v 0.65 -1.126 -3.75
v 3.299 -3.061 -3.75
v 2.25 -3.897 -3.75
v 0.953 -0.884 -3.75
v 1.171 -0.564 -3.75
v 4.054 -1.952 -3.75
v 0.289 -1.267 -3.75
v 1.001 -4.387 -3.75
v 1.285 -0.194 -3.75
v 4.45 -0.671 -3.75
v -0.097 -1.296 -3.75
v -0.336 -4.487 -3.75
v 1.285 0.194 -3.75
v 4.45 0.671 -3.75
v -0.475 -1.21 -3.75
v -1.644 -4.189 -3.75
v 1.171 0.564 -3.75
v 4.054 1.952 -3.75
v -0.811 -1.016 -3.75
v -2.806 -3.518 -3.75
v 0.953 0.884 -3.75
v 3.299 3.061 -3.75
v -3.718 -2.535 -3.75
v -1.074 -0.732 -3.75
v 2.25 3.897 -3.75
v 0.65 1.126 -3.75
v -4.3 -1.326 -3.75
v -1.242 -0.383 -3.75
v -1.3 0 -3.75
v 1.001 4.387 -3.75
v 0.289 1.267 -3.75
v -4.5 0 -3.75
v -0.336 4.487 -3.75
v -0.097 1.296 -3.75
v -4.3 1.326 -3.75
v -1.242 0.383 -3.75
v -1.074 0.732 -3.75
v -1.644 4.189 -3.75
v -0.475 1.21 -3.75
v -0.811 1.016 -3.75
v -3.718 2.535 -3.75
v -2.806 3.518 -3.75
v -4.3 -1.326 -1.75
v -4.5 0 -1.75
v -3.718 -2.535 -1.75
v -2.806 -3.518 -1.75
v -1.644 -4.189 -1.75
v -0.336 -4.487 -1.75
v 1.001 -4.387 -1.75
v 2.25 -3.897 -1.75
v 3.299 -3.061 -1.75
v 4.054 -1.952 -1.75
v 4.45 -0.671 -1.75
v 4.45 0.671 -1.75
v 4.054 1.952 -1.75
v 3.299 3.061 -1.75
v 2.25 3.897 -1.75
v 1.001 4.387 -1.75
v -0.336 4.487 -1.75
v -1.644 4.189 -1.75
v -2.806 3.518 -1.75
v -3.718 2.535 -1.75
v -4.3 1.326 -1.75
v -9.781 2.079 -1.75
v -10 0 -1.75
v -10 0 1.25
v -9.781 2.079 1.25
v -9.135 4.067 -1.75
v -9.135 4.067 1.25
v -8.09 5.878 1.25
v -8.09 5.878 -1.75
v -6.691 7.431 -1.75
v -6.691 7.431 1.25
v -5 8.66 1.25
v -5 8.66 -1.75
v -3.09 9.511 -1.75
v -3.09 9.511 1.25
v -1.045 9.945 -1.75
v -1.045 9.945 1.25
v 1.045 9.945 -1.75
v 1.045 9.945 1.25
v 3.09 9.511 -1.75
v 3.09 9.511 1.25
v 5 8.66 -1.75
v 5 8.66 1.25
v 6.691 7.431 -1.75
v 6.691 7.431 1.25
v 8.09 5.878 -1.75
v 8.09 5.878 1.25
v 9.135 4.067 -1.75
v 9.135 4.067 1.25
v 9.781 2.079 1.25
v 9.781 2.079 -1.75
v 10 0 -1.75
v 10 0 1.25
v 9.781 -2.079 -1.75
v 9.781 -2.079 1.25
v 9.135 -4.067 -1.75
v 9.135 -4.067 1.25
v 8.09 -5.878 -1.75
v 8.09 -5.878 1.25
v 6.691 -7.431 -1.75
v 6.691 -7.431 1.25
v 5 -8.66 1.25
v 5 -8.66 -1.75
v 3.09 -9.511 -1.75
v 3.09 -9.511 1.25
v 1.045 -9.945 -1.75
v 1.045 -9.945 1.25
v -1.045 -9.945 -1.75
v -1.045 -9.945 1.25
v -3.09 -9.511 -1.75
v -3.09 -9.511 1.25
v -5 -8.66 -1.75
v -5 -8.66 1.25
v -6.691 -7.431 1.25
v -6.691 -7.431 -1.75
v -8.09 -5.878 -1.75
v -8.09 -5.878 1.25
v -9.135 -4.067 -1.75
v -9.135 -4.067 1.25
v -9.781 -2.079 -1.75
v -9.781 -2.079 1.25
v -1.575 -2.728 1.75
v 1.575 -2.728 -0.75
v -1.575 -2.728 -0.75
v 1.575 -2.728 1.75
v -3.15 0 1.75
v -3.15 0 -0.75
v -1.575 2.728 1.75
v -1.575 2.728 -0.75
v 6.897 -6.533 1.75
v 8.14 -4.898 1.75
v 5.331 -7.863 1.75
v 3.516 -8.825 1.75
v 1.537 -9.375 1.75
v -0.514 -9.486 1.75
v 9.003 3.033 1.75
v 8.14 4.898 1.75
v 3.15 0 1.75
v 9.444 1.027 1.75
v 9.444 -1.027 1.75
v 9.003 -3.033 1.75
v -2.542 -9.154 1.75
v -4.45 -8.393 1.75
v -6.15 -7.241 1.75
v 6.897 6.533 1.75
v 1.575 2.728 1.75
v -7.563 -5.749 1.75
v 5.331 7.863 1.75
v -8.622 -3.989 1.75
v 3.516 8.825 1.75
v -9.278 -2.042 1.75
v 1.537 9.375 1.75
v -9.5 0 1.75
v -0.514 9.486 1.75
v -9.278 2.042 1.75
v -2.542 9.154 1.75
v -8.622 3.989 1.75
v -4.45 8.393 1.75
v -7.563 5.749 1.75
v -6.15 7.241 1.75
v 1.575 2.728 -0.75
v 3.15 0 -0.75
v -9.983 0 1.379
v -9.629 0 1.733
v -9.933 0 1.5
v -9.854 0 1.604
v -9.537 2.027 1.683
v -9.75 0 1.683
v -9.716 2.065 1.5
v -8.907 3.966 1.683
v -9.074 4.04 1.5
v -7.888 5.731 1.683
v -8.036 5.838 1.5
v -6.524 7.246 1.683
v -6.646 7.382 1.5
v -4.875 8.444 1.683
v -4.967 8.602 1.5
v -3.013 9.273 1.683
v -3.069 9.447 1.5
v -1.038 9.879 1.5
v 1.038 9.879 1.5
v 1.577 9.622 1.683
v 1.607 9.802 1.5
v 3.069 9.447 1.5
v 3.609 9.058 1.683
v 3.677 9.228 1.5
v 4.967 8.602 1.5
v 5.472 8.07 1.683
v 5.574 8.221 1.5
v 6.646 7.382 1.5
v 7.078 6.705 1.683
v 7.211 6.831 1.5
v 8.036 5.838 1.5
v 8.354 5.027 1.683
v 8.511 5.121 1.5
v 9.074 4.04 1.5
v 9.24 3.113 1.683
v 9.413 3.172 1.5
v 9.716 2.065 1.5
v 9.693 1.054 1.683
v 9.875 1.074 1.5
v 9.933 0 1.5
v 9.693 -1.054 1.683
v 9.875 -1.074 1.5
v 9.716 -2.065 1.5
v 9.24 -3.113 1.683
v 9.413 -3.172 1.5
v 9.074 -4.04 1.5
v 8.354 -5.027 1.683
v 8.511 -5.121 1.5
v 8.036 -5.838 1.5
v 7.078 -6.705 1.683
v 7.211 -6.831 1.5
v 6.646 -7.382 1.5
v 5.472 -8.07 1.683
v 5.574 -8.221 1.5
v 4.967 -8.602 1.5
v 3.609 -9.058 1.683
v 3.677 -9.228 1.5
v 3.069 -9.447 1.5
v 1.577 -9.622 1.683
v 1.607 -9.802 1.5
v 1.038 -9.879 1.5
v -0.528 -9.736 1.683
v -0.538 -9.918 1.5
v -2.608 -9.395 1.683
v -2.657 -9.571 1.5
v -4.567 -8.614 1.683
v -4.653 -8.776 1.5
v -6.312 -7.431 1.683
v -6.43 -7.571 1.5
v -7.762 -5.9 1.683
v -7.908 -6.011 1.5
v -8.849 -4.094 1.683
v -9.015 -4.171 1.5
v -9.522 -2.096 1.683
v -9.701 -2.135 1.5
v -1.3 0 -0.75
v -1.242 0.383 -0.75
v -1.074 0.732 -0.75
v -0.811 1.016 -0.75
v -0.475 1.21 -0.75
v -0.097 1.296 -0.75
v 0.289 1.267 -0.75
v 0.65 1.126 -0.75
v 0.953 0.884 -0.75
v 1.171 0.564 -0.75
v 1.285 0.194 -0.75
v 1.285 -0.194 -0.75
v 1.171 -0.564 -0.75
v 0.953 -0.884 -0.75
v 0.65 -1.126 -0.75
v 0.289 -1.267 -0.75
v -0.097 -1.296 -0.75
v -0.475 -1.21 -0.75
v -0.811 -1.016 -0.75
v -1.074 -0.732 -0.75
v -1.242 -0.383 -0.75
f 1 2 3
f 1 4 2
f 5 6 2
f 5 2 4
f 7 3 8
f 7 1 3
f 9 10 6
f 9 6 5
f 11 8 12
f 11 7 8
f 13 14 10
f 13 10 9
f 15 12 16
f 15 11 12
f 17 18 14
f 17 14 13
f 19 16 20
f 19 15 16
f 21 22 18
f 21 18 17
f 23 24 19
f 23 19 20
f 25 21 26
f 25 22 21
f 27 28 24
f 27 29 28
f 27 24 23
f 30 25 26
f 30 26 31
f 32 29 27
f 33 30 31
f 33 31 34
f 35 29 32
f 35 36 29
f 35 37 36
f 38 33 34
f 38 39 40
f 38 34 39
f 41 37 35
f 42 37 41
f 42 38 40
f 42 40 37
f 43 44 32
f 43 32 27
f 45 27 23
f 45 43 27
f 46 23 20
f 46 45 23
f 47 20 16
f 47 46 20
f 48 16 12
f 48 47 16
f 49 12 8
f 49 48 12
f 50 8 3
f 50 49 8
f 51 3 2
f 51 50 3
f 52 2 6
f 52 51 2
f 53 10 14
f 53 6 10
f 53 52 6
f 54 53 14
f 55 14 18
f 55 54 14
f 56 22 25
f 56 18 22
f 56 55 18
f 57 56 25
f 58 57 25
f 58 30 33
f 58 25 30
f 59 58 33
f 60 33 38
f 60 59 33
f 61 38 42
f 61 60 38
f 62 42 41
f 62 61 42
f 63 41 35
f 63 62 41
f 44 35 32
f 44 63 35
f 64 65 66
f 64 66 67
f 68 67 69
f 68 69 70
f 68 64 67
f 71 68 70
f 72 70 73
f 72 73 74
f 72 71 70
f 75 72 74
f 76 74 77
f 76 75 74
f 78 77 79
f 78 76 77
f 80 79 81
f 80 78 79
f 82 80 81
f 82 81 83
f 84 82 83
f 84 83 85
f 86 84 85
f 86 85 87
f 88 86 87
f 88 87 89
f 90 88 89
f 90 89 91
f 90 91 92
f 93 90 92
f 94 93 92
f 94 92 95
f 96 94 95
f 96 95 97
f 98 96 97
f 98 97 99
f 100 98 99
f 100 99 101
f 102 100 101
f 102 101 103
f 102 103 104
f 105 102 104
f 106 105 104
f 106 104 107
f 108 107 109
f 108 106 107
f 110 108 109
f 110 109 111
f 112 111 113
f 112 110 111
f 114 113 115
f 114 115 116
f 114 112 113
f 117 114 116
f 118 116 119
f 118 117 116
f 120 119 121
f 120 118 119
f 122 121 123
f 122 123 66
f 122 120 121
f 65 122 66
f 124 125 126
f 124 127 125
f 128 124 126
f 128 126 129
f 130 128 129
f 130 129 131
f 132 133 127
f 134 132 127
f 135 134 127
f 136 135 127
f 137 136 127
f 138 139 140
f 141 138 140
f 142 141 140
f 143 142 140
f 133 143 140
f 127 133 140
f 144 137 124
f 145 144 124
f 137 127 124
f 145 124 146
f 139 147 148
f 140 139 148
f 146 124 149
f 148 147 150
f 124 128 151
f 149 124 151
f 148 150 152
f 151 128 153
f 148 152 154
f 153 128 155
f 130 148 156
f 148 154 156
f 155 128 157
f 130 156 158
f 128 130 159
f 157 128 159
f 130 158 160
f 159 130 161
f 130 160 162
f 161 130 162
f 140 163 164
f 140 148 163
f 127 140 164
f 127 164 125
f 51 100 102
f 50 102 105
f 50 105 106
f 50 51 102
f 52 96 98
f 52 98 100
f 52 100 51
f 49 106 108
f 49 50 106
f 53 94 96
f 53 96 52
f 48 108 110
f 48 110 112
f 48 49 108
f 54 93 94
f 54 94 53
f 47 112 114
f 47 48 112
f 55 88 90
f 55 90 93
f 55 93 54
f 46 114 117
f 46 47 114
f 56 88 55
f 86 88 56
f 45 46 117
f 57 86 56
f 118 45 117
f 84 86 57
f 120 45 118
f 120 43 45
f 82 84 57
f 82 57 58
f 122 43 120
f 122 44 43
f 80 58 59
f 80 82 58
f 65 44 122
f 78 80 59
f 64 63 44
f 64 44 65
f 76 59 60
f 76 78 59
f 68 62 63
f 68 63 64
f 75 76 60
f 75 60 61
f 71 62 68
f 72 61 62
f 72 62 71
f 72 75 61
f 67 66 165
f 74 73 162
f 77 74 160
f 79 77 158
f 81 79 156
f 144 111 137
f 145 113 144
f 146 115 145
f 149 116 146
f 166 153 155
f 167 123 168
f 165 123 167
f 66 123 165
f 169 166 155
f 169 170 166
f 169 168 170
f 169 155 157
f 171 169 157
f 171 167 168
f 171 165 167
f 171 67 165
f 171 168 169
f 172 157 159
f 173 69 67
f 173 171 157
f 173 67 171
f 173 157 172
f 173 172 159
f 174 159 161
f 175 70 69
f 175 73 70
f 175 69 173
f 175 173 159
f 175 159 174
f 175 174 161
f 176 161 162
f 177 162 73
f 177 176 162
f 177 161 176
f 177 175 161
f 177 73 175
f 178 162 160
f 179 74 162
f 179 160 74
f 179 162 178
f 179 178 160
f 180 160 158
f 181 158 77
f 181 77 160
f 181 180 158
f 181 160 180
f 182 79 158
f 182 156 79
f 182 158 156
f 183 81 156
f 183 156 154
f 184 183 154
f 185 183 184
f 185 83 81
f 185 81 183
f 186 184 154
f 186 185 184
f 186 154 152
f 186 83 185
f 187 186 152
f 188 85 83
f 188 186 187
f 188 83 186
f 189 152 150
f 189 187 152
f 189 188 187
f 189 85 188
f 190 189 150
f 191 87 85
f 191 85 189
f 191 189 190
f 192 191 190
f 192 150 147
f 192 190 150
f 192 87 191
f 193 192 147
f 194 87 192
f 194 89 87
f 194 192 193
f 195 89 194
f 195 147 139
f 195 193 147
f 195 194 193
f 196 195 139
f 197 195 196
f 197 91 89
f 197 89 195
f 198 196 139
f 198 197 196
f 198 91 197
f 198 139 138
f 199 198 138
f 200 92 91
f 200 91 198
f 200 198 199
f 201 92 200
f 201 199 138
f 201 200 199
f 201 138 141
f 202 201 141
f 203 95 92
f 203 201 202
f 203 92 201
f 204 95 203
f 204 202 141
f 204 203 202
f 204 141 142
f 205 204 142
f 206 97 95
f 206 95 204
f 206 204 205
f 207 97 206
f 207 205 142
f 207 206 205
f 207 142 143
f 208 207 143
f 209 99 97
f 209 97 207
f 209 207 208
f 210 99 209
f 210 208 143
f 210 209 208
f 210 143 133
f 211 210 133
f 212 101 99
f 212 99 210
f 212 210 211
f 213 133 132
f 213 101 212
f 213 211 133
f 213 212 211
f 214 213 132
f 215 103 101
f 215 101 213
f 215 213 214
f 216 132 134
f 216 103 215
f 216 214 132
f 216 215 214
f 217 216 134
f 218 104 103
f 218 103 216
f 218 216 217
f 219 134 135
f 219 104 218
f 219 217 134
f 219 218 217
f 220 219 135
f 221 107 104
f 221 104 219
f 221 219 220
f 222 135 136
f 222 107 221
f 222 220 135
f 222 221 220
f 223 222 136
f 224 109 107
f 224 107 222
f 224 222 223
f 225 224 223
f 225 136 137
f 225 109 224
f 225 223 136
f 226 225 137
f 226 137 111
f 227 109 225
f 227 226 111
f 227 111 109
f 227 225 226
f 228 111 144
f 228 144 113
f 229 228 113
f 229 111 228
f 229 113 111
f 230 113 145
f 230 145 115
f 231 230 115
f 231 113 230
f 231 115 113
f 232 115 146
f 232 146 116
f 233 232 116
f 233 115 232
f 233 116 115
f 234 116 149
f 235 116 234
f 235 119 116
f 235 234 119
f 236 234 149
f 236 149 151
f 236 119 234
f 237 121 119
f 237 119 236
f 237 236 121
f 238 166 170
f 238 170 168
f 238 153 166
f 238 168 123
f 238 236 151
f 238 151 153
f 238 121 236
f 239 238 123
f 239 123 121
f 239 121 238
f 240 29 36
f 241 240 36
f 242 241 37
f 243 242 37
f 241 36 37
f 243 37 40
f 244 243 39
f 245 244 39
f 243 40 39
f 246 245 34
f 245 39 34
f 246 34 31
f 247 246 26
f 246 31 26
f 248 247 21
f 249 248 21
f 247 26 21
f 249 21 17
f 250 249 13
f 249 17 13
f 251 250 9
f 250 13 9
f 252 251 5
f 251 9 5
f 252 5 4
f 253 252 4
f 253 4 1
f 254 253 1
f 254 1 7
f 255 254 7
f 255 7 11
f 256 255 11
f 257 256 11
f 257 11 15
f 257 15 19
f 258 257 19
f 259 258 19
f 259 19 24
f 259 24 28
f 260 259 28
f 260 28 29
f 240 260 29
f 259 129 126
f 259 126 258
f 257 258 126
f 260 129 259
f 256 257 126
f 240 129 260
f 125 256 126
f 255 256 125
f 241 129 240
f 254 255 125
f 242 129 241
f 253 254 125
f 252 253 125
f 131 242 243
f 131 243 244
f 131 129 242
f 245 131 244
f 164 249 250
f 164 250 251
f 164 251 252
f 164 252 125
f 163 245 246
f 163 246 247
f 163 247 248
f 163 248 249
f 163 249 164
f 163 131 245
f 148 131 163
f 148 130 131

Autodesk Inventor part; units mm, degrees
ref_plane "YZ Plane" through (0, 0, 0) normal (1, 0, 0) x (0, 1, 0)
ref_plane "XZ Plane" through (0, 0, 0) normal (0, 1, 0) x (-1, 0, 0)
sketch "Эскиз1" plane through (0, 0, 0) normal (0, 1, 0) x (-1, 0, 0)
  line L0 (-10, 1.75) -> (10, 1.75)
  line L1 (10, 1.75) -> (10, -1.75)
  line L2 (10, -1.75) -> (-10, -1.75)
  line L3 (-10, -1.75) -> (-10, 1.75)
  line L4 (-10, 1.75) -> (10, -1.75) construction
  line L5 (10, 1.75) -> (-10, -1.75) construction
  line L6 (2.5, -1.75) -> (-2.5, -1.75)
  line L7 (-2.5, -1.75) -> (-2.5, -3.95)
  line L8 (-2.5, -3.95) -> (2.5, -3.95)
  line L9 (2.5, -3.95) -> (2.5, -1.75)
  line L10 (0, 1.75) -> (0, -1.75)
  point P0 (0, 0)
  dimension "d0" = 20
  dimension "d1" = 3.5
  dimension "d2" = 5
  dimension "d3" = 2.2
revolve "Вращение1" add sketch "Эскиз1" angle 360 about axis through (0, 0, 1.75) along (0, 0, -1) contours L0 L1 L2 L10
ref_plane "РабПлоскость2" through (-7.5, 5, 1.5) normal (0, 0, 1) x (1, 0, 0)
sketch "Эскиз4" plane through (0, 0, -1.75) normal (0, 0, -1) x (-1, 0, 0)
  circle A0 centre (0, 0) radius 1.3
  circle A1 centre (0, 0) radius 4.5
  point P0 (0, 0)
  dimension "d20" = 2.6
  dimension "d21" = 9
extrude "Выдавливание5" add sketch "Эскиз4" along normal blind 2
extrude "Выдавливание6" cut sketch "Эскиз4" against normal mid plane 12 contours A0
fillet "Сопряжение1" radius 0.5 1 edges at (10, 0, 1.75)
sketch "Эскиз5" plane through (0, 0, 1.75) normal (0, 0, 1) x (1, 0, 0)
  circle A0 centre (0, 0) radius 3.15 construction
  line L0 (0, 0) -> (1.575, 2.728) construction
  line L1 (0, 0) -> (-1.575, 2.728) construction
  line L2 (0, 0) -> (-3.15, 0) construction
  line L3 (0, 0) -> (-1.575, -2.728) construction
  line L4 (0, 0) -> (1.575, -2.728) construction
  line L5 (0, 0) -> (3.15, 0) construction
  line L6 (1.575, 2.728) -> (3.15, 0)
  line L7 (-1.575, 2.728) -> (1.575, 2.728)
  line L8 (-3.15, 0) -> (-1.575, 2.728)
  line L9 (-1.575, -2.728) -> (-3.15, 0)
  line L10 (1.575, -2.728) -> (-1.575, -2.728)
  line L11 (3.15, 0) -> (1.575, -2.728)
  point P0 (0, 0)
  point P1 (-1.575, -2.728)
  point P2 (3.15, 0)
  point P3 (1.575, 2.728)
  dimension "d29" = 6.3
  dimension "d32" = 360
  dimension "d36" = 360
extrude "Выдавливание7" cut sketch "Эскиз5" against normal blind 2.5
properties part number "kikcer_head_001"
